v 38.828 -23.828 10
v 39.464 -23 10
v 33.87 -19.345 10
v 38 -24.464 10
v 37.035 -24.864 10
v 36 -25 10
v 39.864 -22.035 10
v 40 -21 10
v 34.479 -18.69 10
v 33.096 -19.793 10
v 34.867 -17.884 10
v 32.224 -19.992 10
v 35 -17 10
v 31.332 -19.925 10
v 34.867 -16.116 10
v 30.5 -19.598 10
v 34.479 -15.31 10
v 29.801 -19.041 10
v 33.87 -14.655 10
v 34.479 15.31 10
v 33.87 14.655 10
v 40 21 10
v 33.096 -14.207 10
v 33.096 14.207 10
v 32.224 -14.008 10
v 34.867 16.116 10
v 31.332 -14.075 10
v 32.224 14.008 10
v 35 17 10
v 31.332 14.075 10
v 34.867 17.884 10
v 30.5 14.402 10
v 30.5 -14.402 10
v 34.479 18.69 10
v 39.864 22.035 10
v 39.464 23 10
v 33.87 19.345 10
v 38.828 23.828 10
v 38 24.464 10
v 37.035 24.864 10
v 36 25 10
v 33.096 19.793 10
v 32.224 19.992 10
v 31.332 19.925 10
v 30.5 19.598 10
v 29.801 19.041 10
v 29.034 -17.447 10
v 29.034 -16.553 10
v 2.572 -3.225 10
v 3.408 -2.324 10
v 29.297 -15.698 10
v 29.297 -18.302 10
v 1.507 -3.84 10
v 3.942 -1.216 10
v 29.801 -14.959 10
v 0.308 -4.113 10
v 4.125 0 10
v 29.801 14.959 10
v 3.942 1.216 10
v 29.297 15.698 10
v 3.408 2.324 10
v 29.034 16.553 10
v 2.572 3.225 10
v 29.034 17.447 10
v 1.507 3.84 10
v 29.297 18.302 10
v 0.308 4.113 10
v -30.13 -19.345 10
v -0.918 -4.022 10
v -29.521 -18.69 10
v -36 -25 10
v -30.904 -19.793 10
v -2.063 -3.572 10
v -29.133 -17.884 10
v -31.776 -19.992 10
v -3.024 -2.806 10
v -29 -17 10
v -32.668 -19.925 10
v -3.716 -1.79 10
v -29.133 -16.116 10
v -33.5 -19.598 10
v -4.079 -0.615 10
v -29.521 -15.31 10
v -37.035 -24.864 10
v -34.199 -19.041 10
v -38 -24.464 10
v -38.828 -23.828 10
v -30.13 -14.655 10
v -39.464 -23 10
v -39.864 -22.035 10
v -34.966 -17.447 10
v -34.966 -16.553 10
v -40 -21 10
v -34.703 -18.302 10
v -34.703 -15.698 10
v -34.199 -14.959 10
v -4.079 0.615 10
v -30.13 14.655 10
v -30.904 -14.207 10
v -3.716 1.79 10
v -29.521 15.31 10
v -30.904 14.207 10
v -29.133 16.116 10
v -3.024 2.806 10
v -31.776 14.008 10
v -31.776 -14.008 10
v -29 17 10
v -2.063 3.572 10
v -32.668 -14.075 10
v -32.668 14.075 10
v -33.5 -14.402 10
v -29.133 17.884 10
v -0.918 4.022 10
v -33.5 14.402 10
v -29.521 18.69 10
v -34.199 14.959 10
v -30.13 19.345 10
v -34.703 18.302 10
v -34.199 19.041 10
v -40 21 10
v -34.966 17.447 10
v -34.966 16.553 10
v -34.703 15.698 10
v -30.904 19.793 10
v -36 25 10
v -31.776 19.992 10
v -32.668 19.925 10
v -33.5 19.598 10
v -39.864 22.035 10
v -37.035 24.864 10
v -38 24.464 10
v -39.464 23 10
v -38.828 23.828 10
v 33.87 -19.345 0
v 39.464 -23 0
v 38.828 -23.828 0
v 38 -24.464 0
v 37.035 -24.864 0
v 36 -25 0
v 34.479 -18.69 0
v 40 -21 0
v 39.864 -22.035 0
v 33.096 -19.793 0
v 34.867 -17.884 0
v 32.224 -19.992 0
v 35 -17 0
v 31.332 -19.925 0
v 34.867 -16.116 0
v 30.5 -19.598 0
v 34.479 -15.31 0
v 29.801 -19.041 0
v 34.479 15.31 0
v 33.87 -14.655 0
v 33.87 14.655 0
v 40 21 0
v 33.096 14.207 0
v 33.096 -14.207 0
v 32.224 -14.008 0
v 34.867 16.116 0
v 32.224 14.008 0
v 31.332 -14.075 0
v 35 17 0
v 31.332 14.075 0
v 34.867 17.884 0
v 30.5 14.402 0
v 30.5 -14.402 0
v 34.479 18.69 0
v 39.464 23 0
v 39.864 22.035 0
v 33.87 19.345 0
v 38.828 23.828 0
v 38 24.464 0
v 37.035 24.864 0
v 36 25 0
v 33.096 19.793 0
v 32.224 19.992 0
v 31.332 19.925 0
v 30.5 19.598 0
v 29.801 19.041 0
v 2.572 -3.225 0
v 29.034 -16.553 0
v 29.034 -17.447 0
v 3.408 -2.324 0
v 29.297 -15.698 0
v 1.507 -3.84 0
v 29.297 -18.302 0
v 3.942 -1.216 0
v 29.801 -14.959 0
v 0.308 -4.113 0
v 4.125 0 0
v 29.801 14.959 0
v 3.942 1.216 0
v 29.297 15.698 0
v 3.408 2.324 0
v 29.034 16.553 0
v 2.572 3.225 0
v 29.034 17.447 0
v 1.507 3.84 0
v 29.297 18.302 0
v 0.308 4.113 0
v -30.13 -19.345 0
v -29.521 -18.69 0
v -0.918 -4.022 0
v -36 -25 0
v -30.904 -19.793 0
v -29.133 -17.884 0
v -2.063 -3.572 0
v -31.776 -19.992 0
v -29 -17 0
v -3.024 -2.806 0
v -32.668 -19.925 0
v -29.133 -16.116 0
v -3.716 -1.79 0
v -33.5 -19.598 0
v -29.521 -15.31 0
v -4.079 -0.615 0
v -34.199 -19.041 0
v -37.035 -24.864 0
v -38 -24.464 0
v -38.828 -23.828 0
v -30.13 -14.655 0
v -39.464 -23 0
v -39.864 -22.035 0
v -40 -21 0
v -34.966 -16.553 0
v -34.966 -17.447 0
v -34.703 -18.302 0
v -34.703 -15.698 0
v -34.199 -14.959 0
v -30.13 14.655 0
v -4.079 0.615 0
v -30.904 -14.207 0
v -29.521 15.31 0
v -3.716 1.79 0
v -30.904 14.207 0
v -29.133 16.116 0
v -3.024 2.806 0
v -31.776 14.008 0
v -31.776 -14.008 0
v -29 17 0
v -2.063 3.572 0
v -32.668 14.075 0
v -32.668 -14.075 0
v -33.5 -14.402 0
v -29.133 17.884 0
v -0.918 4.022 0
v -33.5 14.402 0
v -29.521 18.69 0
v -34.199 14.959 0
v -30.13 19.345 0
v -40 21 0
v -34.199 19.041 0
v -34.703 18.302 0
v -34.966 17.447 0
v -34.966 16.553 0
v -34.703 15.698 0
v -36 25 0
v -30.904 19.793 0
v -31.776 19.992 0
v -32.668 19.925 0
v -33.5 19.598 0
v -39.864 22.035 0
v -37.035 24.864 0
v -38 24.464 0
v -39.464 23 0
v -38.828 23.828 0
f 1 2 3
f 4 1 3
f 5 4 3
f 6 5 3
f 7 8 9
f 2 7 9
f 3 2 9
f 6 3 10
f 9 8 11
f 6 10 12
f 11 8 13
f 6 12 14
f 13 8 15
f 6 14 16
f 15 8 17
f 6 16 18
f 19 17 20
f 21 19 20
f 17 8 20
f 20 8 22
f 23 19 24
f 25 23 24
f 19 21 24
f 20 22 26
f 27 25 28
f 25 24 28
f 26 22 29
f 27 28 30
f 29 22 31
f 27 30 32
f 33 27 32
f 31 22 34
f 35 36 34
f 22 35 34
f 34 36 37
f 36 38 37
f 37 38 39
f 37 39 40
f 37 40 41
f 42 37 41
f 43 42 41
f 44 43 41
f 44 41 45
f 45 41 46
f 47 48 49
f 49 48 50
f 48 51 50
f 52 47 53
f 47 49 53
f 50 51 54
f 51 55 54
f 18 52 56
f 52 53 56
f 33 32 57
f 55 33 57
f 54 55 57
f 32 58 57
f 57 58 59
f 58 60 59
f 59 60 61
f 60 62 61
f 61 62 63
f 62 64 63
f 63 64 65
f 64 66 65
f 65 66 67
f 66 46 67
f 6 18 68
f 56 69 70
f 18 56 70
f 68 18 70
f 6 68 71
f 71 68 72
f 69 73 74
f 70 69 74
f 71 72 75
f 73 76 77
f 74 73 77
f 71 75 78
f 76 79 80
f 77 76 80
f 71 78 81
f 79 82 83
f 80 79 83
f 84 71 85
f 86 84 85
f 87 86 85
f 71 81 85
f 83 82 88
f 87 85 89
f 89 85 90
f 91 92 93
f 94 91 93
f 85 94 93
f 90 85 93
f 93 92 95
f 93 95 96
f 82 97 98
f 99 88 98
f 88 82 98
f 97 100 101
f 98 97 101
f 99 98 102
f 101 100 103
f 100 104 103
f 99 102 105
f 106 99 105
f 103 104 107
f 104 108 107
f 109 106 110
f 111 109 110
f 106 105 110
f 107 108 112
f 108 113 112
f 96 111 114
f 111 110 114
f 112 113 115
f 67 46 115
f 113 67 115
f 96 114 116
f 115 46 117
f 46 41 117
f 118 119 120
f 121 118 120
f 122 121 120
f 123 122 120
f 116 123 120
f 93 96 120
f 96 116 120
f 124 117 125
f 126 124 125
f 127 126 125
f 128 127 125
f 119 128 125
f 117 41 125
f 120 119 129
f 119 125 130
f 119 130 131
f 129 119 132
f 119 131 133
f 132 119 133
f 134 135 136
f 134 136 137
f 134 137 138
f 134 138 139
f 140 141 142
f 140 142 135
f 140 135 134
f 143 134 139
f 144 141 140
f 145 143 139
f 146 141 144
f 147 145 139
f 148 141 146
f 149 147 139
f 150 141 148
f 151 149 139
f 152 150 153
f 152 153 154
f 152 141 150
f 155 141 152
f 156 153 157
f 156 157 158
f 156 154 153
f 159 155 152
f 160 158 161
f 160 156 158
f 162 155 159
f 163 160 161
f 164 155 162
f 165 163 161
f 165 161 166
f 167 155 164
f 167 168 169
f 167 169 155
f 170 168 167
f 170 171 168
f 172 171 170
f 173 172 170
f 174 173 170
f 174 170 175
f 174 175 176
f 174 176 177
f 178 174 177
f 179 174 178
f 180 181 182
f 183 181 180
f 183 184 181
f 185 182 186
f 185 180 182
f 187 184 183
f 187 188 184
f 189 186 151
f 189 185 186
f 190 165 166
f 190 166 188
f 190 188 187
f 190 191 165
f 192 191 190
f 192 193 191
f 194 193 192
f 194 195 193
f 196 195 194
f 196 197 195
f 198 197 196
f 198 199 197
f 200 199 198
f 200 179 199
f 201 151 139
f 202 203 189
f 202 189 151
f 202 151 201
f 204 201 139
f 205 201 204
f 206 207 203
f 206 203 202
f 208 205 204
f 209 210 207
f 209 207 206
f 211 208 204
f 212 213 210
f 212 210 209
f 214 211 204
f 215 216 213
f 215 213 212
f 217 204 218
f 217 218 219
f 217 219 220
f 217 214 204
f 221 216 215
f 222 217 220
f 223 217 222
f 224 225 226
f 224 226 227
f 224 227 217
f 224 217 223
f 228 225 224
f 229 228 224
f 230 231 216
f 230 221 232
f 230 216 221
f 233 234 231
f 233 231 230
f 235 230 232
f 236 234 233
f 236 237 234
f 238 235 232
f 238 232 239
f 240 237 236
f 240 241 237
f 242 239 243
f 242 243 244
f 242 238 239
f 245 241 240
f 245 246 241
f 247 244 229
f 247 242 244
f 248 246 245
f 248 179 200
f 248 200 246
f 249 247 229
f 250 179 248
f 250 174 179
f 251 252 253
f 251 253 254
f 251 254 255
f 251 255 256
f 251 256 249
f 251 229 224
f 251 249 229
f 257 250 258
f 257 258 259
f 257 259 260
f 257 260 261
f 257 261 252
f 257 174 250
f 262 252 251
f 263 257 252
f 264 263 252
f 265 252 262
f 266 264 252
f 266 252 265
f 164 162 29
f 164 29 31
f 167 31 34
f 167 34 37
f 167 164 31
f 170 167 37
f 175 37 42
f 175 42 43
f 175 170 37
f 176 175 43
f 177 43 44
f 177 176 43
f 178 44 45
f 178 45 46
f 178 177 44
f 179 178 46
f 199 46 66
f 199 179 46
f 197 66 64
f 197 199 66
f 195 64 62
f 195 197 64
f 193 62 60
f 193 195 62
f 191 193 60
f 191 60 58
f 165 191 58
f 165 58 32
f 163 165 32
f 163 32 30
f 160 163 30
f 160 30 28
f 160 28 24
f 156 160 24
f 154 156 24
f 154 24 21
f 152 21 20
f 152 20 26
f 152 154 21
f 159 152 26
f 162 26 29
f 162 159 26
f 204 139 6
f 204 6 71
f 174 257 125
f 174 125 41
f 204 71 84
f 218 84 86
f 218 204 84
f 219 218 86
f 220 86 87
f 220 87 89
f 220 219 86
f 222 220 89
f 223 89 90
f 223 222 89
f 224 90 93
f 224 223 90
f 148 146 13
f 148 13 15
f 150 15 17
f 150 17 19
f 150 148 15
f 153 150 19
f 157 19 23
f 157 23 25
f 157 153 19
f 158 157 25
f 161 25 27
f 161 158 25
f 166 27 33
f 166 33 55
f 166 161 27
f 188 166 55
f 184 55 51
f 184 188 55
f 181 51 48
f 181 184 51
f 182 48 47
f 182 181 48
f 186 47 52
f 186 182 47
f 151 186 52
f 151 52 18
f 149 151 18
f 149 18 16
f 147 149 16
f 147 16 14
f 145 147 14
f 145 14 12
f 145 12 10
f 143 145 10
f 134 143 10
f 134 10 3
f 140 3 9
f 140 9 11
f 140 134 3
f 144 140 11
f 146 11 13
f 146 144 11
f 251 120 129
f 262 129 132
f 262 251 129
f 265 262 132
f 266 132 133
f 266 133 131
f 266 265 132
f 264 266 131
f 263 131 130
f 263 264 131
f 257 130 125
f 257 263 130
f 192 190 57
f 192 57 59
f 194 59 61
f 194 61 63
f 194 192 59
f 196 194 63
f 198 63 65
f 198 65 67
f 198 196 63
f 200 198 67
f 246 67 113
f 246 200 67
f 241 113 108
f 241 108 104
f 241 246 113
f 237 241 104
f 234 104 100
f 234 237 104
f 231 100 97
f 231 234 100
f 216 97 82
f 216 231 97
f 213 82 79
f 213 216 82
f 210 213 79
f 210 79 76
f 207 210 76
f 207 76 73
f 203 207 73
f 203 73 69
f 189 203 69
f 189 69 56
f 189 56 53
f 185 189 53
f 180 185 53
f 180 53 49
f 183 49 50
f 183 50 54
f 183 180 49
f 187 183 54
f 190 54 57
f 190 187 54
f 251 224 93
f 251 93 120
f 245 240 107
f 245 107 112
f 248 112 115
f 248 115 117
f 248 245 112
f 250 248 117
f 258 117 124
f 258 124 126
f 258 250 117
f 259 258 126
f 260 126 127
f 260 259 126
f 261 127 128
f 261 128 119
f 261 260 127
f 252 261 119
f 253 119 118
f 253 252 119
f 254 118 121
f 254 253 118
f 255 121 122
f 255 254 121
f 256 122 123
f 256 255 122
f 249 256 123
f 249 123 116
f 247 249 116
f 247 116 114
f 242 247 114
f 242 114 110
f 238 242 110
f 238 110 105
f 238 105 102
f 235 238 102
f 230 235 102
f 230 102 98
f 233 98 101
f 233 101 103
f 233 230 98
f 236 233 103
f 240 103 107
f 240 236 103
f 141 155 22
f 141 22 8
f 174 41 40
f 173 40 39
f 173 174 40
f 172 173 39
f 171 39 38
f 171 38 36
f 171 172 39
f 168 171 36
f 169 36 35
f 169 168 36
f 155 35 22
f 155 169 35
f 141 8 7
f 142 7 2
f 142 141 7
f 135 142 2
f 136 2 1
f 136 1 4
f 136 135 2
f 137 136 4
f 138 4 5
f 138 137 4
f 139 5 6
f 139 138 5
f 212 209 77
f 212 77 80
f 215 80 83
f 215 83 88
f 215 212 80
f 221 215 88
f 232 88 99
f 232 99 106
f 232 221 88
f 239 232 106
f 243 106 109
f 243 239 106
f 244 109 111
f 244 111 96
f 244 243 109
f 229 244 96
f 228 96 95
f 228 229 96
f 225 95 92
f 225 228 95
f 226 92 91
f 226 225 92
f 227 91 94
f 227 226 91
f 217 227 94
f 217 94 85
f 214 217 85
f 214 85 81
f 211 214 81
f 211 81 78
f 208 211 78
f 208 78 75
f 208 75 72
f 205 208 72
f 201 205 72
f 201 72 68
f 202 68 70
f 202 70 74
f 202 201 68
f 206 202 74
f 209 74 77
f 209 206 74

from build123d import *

# Parameters (mm, degrees)
MODEL_R             = 3
MODEL_R_2           = 4.125
BOSS_EXTRUDE1_DEPTH = 10


with BuildPart() as part:
    # Model → Boss-Extrude1 (new body)
    with BuildSketch(Plane.XY):
        with BuildLine():
            Line((36, -25), (-36, -25))
            ThreePointArc((-36, -25), (-38.828427125, -23.828427125), (-40, -21))
            Line((-40, -21), (-40, 21))
            ThreePointArc((-40, 21), (-38.828427125, 23.828427125), (-36, 25))
            Line((-36, 25), (36, 25))
            ThreePointArc((36, 25), (38.828427125, 23.828427125), (40, 21))
            Line((40, 21), (40, -21))
            ThreePointArc((40, -21), (38.828427125, -23.828427125), (36, -25))
        make_face()
        with Locations((32, 17)):
            Circle(MODEL_R, mode=Mode.SUBTRACT)
        with Locations((-32, 17)):
            Circle(MODEL_R, mode=Mode.SUBTRACT)
        with Locations((32, -17)):
            Circle(MODEL_R, mode=Mode.SUBTRACT)
        Circle(MODEL_R_2, mode=Mode.SUBTRACT)
        with Locations((-32, -17)):
            Circle(MODEL_R, mode=Mode.SUBTRACT)
    extrude(amount=BOSS_EXTRUDE1_DEPTH)


solid = part.part
